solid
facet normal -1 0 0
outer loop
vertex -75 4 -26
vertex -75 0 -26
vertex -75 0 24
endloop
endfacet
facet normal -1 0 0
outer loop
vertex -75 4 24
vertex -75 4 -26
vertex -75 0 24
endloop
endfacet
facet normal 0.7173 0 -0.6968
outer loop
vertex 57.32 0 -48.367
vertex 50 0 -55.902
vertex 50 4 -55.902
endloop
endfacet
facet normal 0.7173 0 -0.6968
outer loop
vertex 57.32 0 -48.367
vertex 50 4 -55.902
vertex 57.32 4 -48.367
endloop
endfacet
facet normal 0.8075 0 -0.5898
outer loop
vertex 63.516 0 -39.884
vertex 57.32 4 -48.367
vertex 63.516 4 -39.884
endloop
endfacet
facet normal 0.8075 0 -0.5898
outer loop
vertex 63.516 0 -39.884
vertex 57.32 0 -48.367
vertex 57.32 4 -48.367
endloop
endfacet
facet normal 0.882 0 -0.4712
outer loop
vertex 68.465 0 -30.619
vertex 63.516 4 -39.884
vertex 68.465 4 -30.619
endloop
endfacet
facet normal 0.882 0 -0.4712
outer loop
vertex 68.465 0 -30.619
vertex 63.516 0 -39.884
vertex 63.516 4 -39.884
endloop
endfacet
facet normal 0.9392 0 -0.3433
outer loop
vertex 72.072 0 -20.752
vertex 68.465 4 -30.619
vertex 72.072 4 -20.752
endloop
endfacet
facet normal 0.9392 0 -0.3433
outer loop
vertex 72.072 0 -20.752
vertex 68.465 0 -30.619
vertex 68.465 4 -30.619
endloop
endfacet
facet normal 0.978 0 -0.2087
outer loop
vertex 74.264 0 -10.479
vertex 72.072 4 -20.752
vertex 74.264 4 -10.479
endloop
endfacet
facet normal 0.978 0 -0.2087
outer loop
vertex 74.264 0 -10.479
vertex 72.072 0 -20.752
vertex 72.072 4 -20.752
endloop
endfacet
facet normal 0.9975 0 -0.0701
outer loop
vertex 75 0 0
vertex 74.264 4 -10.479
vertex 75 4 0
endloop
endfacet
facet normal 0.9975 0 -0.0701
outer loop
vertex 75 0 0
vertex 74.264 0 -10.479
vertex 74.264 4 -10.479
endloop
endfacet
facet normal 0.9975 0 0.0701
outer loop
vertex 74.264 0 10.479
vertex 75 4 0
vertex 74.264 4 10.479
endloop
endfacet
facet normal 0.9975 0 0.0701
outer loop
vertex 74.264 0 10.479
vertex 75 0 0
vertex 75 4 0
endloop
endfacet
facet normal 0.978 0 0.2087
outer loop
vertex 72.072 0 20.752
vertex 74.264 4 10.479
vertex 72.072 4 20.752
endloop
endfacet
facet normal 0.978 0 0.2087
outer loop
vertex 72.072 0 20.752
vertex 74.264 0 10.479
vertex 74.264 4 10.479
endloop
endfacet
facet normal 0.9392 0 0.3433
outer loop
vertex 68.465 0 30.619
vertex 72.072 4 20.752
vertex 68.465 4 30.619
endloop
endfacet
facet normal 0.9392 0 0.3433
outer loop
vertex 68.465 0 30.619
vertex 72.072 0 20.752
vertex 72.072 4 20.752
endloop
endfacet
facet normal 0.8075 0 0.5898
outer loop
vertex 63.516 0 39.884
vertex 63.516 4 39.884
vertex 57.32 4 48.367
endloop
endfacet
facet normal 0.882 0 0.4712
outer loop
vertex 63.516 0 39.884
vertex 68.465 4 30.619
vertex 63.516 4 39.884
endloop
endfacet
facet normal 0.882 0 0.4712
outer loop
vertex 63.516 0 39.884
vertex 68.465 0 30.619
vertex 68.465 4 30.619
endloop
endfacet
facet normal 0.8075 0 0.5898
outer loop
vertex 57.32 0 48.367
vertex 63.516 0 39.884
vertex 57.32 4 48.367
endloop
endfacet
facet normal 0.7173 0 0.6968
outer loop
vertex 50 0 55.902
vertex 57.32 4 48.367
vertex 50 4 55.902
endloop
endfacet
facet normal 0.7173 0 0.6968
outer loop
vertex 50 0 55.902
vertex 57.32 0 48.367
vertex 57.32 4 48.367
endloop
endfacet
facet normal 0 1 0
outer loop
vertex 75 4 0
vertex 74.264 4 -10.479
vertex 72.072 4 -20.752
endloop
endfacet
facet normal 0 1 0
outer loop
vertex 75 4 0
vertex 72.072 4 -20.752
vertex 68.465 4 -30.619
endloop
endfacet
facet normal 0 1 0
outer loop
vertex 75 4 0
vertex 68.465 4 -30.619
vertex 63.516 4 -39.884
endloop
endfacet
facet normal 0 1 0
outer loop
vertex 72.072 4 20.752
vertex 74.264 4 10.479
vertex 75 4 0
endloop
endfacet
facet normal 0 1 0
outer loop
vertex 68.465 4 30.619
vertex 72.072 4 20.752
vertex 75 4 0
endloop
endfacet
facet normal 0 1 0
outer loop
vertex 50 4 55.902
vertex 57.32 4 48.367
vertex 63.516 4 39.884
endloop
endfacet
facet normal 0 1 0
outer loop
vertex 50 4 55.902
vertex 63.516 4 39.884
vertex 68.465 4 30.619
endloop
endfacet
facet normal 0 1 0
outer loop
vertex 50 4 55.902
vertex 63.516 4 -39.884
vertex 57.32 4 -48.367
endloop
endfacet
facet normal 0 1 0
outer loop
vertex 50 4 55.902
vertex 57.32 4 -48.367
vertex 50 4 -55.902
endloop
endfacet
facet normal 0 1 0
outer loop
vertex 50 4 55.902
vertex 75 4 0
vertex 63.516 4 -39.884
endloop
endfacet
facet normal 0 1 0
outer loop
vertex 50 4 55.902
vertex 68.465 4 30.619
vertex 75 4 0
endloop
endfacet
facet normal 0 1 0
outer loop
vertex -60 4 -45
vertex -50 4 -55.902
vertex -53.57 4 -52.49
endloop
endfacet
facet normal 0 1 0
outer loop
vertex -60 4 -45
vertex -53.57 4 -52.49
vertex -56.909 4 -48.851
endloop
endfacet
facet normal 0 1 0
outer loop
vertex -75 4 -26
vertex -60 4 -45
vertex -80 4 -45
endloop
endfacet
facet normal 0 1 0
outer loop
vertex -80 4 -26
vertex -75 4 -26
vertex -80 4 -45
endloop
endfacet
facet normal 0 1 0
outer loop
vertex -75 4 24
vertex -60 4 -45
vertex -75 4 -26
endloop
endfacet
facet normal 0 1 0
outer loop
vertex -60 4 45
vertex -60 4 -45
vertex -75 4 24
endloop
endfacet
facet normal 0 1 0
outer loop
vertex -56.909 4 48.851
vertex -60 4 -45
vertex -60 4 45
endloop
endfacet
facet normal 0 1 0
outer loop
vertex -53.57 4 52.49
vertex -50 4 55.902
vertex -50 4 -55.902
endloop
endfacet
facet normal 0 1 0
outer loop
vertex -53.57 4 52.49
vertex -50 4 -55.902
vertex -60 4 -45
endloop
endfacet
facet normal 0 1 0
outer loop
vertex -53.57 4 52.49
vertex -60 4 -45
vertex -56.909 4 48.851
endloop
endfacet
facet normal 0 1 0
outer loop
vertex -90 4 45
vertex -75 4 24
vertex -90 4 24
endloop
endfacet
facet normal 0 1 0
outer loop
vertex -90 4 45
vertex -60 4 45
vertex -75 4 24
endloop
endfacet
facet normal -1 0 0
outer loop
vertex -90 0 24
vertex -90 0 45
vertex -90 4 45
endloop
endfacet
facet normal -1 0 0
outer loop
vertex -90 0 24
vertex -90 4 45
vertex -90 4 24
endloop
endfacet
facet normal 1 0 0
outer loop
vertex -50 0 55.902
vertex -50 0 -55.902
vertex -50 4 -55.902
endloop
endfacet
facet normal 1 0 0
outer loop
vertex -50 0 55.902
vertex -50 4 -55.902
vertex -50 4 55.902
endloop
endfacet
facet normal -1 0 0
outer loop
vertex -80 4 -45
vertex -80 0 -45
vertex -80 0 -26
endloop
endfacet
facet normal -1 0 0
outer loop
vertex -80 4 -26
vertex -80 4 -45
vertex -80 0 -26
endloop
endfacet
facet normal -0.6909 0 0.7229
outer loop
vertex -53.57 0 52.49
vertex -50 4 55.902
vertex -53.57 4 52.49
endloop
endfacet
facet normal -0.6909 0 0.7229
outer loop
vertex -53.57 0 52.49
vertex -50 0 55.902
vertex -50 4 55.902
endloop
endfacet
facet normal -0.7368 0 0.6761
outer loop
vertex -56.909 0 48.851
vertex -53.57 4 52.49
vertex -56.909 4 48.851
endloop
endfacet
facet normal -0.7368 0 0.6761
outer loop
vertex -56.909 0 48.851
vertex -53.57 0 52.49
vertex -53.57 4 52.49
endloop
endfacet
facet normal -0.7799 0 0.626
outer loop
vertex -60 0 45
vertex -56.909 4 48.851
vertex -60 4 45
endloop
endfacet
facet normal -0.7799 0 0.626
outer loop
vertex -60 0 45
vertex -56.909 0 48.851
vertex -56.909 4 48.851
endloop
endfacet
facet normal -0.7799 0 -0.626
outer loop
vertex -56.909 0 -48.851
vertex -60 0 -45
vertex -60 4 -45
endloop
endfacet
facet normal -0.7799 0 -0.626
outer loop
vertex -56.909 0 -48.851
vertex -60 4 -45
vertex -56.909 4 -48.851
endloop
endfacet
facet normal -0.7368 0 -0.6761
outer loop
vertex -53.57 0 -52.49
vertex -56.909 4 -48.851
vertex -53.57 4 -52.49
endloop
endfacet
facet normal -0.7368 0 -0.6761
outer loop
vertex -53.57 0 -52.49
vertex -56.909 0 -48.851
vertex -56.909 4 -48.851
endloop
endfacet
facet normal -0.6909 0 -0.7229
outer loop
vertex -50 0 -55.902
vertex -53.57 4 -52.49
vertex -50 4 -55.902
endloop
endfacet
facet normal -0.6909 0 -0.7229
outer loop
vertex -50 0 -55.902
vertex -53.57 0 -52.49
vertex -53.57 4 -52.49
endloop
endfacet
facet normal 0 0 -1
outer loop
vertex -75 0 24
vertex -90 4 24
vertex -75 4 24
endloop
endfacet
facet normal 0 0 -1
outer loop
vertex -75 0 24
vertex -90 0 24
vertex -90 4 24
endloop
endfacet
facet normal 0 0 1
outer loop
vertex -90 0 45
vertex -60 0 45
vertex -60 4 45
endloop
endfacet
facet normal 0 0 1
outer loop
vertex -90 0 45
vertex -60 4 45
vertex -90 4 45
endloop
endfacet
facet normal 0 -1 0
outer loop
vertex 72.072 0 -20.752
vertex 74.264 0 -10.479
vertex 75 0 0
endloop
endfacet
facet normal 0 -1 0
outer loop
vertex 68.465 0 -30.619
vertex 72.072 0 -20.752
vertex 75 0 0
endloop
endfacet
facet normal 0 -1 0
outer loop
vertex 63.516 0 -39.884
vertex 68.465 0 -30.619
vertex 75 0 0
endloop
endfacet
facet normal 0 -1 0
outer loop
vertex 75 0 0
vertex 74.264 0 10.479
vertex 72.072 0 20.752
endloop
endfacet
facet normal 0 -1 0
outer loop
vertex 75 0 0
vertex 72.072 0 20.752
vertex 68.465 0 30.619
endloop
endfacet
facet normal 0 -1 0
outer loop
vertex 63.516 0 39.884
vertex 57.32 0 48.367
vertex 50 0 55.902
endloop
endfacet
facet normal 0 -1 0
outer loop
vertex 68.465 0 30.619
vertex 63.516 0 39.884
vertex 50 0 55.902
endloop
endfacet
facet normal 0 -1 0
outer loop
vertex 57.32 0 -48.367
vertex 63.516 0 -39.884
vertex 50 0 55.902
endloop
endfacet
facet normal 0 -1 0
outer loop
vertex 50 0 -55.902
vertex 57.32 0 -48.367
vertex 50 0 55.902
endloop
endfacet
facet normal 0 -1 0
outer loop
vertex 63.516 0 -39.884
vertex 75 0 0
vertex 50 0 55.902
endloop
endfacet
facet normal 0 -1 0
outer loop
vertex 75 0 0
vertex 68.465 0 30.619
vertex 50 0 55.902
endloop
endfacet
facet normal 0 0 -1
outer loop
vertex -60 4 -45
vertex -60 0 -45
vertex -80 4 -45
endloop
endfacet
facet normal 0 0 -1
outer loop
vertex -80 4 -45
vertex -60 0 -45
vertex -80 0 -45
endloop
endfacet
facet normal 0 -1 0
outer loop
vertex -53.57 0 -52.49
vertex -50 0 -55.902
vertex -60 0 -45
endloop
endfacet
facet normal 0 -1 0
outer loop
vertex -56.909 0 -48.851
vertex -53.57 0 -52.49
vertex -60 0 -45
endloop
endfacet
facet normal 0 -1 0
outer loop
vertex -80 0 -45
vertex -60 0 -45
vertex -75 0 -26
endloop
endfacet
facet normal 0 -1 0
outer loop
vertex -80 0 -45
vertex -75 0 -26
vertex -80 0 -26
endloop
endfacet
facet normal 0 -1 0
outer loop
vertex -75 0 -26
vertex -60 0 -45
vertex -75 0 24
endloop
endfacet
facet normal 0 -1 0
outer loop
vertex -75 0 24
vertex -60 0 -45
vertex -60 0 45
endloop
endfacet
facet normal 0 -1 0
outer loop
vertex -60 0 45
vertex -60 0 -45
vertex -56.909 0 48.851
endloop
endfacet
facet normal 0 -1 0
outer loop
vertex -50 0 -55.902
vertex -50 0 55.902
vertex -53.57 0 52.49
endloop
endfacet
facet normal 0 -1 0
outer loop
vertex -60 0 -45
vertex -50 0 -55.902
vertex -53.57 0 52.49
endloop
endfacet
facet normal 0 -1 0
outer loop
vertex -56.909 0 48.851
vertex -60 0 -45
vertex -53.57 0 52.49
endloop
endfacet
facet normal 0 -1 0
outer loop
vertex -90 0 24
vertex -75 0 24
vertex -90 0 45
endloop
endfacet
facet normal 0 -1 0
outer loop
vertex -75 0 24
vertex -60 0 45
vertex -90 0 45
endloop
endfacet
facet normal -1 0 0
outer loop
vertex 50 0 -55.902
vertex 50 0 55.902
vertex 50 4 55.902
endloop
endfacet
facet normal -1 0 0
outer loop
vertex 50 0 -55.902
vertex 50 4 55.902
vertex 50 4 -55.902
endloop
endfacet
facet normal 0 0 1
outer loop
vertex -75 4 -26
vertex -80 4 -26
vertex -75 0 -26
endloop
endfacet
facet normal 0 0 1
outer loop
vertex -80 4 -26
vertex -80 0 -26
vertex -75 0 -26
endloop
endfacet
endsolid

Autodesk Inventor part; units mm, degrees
ref_plane "YZ Plane" through (0, 0, 0) normal (1, 0, 0) x (0, 1, 0)
ref_plane "XZ Plane" through (0, 0, 0) normal (0, 1, 0) x (-1, 0, 0)
ref_plane "XY Plane" through (0, 0, 0) normal (0, 0, 1) x (1, 0, 0)
sketch "Boceto1" plane through (0, 0, 0) normal (0, 1, 0) x (-1, 0, 0)
  line L0 (-50, 0) -> (-50, -55.9017)
  line L1 (-50, 0) -> (-50, 55.9017)
  line L2 (50, 0) -> (50, -55.9017)
  line L3 (50, 0) -> (50, 55.9017)
  line L4 (50, 0) -> (50, -45)
  line L5 (60, -45) -> (80, -45)
  line L6 (80, -45) -> (80, -26)
  line L7 (80, -26) -> (75, -26)
  line L8 (50, 0) -> (50, 45)
  line L9 (60, 45) -> (90, 45)
  line L10 (90, 45) -> (90, 24)
  line L11 (90, 24) -> (75, 24)
  line L12 (75, -26) -> (75, 24)
  arc A0 (50, -55.9017) -> (60, -45) centre (0, 0) ccw
  arc A1 (60, 45) -> (50, 55.9017) centre (0, 0) ccw
  arc A2 (-50, 55.9017) -> (-50, -55.9017) centre (0, 0) ccw
  dimension "d2" = 45
  dimension "d3" = 30
  dimension "d4" = 19
  dimension "d5" = 5
  dimension "d6" = 45
  dimension "d7" = 40
  dimension "d8" = 21
extrude "Extrusión1" add sketch "Boceto1" along normal blind 4
properties part number "Soportes"
